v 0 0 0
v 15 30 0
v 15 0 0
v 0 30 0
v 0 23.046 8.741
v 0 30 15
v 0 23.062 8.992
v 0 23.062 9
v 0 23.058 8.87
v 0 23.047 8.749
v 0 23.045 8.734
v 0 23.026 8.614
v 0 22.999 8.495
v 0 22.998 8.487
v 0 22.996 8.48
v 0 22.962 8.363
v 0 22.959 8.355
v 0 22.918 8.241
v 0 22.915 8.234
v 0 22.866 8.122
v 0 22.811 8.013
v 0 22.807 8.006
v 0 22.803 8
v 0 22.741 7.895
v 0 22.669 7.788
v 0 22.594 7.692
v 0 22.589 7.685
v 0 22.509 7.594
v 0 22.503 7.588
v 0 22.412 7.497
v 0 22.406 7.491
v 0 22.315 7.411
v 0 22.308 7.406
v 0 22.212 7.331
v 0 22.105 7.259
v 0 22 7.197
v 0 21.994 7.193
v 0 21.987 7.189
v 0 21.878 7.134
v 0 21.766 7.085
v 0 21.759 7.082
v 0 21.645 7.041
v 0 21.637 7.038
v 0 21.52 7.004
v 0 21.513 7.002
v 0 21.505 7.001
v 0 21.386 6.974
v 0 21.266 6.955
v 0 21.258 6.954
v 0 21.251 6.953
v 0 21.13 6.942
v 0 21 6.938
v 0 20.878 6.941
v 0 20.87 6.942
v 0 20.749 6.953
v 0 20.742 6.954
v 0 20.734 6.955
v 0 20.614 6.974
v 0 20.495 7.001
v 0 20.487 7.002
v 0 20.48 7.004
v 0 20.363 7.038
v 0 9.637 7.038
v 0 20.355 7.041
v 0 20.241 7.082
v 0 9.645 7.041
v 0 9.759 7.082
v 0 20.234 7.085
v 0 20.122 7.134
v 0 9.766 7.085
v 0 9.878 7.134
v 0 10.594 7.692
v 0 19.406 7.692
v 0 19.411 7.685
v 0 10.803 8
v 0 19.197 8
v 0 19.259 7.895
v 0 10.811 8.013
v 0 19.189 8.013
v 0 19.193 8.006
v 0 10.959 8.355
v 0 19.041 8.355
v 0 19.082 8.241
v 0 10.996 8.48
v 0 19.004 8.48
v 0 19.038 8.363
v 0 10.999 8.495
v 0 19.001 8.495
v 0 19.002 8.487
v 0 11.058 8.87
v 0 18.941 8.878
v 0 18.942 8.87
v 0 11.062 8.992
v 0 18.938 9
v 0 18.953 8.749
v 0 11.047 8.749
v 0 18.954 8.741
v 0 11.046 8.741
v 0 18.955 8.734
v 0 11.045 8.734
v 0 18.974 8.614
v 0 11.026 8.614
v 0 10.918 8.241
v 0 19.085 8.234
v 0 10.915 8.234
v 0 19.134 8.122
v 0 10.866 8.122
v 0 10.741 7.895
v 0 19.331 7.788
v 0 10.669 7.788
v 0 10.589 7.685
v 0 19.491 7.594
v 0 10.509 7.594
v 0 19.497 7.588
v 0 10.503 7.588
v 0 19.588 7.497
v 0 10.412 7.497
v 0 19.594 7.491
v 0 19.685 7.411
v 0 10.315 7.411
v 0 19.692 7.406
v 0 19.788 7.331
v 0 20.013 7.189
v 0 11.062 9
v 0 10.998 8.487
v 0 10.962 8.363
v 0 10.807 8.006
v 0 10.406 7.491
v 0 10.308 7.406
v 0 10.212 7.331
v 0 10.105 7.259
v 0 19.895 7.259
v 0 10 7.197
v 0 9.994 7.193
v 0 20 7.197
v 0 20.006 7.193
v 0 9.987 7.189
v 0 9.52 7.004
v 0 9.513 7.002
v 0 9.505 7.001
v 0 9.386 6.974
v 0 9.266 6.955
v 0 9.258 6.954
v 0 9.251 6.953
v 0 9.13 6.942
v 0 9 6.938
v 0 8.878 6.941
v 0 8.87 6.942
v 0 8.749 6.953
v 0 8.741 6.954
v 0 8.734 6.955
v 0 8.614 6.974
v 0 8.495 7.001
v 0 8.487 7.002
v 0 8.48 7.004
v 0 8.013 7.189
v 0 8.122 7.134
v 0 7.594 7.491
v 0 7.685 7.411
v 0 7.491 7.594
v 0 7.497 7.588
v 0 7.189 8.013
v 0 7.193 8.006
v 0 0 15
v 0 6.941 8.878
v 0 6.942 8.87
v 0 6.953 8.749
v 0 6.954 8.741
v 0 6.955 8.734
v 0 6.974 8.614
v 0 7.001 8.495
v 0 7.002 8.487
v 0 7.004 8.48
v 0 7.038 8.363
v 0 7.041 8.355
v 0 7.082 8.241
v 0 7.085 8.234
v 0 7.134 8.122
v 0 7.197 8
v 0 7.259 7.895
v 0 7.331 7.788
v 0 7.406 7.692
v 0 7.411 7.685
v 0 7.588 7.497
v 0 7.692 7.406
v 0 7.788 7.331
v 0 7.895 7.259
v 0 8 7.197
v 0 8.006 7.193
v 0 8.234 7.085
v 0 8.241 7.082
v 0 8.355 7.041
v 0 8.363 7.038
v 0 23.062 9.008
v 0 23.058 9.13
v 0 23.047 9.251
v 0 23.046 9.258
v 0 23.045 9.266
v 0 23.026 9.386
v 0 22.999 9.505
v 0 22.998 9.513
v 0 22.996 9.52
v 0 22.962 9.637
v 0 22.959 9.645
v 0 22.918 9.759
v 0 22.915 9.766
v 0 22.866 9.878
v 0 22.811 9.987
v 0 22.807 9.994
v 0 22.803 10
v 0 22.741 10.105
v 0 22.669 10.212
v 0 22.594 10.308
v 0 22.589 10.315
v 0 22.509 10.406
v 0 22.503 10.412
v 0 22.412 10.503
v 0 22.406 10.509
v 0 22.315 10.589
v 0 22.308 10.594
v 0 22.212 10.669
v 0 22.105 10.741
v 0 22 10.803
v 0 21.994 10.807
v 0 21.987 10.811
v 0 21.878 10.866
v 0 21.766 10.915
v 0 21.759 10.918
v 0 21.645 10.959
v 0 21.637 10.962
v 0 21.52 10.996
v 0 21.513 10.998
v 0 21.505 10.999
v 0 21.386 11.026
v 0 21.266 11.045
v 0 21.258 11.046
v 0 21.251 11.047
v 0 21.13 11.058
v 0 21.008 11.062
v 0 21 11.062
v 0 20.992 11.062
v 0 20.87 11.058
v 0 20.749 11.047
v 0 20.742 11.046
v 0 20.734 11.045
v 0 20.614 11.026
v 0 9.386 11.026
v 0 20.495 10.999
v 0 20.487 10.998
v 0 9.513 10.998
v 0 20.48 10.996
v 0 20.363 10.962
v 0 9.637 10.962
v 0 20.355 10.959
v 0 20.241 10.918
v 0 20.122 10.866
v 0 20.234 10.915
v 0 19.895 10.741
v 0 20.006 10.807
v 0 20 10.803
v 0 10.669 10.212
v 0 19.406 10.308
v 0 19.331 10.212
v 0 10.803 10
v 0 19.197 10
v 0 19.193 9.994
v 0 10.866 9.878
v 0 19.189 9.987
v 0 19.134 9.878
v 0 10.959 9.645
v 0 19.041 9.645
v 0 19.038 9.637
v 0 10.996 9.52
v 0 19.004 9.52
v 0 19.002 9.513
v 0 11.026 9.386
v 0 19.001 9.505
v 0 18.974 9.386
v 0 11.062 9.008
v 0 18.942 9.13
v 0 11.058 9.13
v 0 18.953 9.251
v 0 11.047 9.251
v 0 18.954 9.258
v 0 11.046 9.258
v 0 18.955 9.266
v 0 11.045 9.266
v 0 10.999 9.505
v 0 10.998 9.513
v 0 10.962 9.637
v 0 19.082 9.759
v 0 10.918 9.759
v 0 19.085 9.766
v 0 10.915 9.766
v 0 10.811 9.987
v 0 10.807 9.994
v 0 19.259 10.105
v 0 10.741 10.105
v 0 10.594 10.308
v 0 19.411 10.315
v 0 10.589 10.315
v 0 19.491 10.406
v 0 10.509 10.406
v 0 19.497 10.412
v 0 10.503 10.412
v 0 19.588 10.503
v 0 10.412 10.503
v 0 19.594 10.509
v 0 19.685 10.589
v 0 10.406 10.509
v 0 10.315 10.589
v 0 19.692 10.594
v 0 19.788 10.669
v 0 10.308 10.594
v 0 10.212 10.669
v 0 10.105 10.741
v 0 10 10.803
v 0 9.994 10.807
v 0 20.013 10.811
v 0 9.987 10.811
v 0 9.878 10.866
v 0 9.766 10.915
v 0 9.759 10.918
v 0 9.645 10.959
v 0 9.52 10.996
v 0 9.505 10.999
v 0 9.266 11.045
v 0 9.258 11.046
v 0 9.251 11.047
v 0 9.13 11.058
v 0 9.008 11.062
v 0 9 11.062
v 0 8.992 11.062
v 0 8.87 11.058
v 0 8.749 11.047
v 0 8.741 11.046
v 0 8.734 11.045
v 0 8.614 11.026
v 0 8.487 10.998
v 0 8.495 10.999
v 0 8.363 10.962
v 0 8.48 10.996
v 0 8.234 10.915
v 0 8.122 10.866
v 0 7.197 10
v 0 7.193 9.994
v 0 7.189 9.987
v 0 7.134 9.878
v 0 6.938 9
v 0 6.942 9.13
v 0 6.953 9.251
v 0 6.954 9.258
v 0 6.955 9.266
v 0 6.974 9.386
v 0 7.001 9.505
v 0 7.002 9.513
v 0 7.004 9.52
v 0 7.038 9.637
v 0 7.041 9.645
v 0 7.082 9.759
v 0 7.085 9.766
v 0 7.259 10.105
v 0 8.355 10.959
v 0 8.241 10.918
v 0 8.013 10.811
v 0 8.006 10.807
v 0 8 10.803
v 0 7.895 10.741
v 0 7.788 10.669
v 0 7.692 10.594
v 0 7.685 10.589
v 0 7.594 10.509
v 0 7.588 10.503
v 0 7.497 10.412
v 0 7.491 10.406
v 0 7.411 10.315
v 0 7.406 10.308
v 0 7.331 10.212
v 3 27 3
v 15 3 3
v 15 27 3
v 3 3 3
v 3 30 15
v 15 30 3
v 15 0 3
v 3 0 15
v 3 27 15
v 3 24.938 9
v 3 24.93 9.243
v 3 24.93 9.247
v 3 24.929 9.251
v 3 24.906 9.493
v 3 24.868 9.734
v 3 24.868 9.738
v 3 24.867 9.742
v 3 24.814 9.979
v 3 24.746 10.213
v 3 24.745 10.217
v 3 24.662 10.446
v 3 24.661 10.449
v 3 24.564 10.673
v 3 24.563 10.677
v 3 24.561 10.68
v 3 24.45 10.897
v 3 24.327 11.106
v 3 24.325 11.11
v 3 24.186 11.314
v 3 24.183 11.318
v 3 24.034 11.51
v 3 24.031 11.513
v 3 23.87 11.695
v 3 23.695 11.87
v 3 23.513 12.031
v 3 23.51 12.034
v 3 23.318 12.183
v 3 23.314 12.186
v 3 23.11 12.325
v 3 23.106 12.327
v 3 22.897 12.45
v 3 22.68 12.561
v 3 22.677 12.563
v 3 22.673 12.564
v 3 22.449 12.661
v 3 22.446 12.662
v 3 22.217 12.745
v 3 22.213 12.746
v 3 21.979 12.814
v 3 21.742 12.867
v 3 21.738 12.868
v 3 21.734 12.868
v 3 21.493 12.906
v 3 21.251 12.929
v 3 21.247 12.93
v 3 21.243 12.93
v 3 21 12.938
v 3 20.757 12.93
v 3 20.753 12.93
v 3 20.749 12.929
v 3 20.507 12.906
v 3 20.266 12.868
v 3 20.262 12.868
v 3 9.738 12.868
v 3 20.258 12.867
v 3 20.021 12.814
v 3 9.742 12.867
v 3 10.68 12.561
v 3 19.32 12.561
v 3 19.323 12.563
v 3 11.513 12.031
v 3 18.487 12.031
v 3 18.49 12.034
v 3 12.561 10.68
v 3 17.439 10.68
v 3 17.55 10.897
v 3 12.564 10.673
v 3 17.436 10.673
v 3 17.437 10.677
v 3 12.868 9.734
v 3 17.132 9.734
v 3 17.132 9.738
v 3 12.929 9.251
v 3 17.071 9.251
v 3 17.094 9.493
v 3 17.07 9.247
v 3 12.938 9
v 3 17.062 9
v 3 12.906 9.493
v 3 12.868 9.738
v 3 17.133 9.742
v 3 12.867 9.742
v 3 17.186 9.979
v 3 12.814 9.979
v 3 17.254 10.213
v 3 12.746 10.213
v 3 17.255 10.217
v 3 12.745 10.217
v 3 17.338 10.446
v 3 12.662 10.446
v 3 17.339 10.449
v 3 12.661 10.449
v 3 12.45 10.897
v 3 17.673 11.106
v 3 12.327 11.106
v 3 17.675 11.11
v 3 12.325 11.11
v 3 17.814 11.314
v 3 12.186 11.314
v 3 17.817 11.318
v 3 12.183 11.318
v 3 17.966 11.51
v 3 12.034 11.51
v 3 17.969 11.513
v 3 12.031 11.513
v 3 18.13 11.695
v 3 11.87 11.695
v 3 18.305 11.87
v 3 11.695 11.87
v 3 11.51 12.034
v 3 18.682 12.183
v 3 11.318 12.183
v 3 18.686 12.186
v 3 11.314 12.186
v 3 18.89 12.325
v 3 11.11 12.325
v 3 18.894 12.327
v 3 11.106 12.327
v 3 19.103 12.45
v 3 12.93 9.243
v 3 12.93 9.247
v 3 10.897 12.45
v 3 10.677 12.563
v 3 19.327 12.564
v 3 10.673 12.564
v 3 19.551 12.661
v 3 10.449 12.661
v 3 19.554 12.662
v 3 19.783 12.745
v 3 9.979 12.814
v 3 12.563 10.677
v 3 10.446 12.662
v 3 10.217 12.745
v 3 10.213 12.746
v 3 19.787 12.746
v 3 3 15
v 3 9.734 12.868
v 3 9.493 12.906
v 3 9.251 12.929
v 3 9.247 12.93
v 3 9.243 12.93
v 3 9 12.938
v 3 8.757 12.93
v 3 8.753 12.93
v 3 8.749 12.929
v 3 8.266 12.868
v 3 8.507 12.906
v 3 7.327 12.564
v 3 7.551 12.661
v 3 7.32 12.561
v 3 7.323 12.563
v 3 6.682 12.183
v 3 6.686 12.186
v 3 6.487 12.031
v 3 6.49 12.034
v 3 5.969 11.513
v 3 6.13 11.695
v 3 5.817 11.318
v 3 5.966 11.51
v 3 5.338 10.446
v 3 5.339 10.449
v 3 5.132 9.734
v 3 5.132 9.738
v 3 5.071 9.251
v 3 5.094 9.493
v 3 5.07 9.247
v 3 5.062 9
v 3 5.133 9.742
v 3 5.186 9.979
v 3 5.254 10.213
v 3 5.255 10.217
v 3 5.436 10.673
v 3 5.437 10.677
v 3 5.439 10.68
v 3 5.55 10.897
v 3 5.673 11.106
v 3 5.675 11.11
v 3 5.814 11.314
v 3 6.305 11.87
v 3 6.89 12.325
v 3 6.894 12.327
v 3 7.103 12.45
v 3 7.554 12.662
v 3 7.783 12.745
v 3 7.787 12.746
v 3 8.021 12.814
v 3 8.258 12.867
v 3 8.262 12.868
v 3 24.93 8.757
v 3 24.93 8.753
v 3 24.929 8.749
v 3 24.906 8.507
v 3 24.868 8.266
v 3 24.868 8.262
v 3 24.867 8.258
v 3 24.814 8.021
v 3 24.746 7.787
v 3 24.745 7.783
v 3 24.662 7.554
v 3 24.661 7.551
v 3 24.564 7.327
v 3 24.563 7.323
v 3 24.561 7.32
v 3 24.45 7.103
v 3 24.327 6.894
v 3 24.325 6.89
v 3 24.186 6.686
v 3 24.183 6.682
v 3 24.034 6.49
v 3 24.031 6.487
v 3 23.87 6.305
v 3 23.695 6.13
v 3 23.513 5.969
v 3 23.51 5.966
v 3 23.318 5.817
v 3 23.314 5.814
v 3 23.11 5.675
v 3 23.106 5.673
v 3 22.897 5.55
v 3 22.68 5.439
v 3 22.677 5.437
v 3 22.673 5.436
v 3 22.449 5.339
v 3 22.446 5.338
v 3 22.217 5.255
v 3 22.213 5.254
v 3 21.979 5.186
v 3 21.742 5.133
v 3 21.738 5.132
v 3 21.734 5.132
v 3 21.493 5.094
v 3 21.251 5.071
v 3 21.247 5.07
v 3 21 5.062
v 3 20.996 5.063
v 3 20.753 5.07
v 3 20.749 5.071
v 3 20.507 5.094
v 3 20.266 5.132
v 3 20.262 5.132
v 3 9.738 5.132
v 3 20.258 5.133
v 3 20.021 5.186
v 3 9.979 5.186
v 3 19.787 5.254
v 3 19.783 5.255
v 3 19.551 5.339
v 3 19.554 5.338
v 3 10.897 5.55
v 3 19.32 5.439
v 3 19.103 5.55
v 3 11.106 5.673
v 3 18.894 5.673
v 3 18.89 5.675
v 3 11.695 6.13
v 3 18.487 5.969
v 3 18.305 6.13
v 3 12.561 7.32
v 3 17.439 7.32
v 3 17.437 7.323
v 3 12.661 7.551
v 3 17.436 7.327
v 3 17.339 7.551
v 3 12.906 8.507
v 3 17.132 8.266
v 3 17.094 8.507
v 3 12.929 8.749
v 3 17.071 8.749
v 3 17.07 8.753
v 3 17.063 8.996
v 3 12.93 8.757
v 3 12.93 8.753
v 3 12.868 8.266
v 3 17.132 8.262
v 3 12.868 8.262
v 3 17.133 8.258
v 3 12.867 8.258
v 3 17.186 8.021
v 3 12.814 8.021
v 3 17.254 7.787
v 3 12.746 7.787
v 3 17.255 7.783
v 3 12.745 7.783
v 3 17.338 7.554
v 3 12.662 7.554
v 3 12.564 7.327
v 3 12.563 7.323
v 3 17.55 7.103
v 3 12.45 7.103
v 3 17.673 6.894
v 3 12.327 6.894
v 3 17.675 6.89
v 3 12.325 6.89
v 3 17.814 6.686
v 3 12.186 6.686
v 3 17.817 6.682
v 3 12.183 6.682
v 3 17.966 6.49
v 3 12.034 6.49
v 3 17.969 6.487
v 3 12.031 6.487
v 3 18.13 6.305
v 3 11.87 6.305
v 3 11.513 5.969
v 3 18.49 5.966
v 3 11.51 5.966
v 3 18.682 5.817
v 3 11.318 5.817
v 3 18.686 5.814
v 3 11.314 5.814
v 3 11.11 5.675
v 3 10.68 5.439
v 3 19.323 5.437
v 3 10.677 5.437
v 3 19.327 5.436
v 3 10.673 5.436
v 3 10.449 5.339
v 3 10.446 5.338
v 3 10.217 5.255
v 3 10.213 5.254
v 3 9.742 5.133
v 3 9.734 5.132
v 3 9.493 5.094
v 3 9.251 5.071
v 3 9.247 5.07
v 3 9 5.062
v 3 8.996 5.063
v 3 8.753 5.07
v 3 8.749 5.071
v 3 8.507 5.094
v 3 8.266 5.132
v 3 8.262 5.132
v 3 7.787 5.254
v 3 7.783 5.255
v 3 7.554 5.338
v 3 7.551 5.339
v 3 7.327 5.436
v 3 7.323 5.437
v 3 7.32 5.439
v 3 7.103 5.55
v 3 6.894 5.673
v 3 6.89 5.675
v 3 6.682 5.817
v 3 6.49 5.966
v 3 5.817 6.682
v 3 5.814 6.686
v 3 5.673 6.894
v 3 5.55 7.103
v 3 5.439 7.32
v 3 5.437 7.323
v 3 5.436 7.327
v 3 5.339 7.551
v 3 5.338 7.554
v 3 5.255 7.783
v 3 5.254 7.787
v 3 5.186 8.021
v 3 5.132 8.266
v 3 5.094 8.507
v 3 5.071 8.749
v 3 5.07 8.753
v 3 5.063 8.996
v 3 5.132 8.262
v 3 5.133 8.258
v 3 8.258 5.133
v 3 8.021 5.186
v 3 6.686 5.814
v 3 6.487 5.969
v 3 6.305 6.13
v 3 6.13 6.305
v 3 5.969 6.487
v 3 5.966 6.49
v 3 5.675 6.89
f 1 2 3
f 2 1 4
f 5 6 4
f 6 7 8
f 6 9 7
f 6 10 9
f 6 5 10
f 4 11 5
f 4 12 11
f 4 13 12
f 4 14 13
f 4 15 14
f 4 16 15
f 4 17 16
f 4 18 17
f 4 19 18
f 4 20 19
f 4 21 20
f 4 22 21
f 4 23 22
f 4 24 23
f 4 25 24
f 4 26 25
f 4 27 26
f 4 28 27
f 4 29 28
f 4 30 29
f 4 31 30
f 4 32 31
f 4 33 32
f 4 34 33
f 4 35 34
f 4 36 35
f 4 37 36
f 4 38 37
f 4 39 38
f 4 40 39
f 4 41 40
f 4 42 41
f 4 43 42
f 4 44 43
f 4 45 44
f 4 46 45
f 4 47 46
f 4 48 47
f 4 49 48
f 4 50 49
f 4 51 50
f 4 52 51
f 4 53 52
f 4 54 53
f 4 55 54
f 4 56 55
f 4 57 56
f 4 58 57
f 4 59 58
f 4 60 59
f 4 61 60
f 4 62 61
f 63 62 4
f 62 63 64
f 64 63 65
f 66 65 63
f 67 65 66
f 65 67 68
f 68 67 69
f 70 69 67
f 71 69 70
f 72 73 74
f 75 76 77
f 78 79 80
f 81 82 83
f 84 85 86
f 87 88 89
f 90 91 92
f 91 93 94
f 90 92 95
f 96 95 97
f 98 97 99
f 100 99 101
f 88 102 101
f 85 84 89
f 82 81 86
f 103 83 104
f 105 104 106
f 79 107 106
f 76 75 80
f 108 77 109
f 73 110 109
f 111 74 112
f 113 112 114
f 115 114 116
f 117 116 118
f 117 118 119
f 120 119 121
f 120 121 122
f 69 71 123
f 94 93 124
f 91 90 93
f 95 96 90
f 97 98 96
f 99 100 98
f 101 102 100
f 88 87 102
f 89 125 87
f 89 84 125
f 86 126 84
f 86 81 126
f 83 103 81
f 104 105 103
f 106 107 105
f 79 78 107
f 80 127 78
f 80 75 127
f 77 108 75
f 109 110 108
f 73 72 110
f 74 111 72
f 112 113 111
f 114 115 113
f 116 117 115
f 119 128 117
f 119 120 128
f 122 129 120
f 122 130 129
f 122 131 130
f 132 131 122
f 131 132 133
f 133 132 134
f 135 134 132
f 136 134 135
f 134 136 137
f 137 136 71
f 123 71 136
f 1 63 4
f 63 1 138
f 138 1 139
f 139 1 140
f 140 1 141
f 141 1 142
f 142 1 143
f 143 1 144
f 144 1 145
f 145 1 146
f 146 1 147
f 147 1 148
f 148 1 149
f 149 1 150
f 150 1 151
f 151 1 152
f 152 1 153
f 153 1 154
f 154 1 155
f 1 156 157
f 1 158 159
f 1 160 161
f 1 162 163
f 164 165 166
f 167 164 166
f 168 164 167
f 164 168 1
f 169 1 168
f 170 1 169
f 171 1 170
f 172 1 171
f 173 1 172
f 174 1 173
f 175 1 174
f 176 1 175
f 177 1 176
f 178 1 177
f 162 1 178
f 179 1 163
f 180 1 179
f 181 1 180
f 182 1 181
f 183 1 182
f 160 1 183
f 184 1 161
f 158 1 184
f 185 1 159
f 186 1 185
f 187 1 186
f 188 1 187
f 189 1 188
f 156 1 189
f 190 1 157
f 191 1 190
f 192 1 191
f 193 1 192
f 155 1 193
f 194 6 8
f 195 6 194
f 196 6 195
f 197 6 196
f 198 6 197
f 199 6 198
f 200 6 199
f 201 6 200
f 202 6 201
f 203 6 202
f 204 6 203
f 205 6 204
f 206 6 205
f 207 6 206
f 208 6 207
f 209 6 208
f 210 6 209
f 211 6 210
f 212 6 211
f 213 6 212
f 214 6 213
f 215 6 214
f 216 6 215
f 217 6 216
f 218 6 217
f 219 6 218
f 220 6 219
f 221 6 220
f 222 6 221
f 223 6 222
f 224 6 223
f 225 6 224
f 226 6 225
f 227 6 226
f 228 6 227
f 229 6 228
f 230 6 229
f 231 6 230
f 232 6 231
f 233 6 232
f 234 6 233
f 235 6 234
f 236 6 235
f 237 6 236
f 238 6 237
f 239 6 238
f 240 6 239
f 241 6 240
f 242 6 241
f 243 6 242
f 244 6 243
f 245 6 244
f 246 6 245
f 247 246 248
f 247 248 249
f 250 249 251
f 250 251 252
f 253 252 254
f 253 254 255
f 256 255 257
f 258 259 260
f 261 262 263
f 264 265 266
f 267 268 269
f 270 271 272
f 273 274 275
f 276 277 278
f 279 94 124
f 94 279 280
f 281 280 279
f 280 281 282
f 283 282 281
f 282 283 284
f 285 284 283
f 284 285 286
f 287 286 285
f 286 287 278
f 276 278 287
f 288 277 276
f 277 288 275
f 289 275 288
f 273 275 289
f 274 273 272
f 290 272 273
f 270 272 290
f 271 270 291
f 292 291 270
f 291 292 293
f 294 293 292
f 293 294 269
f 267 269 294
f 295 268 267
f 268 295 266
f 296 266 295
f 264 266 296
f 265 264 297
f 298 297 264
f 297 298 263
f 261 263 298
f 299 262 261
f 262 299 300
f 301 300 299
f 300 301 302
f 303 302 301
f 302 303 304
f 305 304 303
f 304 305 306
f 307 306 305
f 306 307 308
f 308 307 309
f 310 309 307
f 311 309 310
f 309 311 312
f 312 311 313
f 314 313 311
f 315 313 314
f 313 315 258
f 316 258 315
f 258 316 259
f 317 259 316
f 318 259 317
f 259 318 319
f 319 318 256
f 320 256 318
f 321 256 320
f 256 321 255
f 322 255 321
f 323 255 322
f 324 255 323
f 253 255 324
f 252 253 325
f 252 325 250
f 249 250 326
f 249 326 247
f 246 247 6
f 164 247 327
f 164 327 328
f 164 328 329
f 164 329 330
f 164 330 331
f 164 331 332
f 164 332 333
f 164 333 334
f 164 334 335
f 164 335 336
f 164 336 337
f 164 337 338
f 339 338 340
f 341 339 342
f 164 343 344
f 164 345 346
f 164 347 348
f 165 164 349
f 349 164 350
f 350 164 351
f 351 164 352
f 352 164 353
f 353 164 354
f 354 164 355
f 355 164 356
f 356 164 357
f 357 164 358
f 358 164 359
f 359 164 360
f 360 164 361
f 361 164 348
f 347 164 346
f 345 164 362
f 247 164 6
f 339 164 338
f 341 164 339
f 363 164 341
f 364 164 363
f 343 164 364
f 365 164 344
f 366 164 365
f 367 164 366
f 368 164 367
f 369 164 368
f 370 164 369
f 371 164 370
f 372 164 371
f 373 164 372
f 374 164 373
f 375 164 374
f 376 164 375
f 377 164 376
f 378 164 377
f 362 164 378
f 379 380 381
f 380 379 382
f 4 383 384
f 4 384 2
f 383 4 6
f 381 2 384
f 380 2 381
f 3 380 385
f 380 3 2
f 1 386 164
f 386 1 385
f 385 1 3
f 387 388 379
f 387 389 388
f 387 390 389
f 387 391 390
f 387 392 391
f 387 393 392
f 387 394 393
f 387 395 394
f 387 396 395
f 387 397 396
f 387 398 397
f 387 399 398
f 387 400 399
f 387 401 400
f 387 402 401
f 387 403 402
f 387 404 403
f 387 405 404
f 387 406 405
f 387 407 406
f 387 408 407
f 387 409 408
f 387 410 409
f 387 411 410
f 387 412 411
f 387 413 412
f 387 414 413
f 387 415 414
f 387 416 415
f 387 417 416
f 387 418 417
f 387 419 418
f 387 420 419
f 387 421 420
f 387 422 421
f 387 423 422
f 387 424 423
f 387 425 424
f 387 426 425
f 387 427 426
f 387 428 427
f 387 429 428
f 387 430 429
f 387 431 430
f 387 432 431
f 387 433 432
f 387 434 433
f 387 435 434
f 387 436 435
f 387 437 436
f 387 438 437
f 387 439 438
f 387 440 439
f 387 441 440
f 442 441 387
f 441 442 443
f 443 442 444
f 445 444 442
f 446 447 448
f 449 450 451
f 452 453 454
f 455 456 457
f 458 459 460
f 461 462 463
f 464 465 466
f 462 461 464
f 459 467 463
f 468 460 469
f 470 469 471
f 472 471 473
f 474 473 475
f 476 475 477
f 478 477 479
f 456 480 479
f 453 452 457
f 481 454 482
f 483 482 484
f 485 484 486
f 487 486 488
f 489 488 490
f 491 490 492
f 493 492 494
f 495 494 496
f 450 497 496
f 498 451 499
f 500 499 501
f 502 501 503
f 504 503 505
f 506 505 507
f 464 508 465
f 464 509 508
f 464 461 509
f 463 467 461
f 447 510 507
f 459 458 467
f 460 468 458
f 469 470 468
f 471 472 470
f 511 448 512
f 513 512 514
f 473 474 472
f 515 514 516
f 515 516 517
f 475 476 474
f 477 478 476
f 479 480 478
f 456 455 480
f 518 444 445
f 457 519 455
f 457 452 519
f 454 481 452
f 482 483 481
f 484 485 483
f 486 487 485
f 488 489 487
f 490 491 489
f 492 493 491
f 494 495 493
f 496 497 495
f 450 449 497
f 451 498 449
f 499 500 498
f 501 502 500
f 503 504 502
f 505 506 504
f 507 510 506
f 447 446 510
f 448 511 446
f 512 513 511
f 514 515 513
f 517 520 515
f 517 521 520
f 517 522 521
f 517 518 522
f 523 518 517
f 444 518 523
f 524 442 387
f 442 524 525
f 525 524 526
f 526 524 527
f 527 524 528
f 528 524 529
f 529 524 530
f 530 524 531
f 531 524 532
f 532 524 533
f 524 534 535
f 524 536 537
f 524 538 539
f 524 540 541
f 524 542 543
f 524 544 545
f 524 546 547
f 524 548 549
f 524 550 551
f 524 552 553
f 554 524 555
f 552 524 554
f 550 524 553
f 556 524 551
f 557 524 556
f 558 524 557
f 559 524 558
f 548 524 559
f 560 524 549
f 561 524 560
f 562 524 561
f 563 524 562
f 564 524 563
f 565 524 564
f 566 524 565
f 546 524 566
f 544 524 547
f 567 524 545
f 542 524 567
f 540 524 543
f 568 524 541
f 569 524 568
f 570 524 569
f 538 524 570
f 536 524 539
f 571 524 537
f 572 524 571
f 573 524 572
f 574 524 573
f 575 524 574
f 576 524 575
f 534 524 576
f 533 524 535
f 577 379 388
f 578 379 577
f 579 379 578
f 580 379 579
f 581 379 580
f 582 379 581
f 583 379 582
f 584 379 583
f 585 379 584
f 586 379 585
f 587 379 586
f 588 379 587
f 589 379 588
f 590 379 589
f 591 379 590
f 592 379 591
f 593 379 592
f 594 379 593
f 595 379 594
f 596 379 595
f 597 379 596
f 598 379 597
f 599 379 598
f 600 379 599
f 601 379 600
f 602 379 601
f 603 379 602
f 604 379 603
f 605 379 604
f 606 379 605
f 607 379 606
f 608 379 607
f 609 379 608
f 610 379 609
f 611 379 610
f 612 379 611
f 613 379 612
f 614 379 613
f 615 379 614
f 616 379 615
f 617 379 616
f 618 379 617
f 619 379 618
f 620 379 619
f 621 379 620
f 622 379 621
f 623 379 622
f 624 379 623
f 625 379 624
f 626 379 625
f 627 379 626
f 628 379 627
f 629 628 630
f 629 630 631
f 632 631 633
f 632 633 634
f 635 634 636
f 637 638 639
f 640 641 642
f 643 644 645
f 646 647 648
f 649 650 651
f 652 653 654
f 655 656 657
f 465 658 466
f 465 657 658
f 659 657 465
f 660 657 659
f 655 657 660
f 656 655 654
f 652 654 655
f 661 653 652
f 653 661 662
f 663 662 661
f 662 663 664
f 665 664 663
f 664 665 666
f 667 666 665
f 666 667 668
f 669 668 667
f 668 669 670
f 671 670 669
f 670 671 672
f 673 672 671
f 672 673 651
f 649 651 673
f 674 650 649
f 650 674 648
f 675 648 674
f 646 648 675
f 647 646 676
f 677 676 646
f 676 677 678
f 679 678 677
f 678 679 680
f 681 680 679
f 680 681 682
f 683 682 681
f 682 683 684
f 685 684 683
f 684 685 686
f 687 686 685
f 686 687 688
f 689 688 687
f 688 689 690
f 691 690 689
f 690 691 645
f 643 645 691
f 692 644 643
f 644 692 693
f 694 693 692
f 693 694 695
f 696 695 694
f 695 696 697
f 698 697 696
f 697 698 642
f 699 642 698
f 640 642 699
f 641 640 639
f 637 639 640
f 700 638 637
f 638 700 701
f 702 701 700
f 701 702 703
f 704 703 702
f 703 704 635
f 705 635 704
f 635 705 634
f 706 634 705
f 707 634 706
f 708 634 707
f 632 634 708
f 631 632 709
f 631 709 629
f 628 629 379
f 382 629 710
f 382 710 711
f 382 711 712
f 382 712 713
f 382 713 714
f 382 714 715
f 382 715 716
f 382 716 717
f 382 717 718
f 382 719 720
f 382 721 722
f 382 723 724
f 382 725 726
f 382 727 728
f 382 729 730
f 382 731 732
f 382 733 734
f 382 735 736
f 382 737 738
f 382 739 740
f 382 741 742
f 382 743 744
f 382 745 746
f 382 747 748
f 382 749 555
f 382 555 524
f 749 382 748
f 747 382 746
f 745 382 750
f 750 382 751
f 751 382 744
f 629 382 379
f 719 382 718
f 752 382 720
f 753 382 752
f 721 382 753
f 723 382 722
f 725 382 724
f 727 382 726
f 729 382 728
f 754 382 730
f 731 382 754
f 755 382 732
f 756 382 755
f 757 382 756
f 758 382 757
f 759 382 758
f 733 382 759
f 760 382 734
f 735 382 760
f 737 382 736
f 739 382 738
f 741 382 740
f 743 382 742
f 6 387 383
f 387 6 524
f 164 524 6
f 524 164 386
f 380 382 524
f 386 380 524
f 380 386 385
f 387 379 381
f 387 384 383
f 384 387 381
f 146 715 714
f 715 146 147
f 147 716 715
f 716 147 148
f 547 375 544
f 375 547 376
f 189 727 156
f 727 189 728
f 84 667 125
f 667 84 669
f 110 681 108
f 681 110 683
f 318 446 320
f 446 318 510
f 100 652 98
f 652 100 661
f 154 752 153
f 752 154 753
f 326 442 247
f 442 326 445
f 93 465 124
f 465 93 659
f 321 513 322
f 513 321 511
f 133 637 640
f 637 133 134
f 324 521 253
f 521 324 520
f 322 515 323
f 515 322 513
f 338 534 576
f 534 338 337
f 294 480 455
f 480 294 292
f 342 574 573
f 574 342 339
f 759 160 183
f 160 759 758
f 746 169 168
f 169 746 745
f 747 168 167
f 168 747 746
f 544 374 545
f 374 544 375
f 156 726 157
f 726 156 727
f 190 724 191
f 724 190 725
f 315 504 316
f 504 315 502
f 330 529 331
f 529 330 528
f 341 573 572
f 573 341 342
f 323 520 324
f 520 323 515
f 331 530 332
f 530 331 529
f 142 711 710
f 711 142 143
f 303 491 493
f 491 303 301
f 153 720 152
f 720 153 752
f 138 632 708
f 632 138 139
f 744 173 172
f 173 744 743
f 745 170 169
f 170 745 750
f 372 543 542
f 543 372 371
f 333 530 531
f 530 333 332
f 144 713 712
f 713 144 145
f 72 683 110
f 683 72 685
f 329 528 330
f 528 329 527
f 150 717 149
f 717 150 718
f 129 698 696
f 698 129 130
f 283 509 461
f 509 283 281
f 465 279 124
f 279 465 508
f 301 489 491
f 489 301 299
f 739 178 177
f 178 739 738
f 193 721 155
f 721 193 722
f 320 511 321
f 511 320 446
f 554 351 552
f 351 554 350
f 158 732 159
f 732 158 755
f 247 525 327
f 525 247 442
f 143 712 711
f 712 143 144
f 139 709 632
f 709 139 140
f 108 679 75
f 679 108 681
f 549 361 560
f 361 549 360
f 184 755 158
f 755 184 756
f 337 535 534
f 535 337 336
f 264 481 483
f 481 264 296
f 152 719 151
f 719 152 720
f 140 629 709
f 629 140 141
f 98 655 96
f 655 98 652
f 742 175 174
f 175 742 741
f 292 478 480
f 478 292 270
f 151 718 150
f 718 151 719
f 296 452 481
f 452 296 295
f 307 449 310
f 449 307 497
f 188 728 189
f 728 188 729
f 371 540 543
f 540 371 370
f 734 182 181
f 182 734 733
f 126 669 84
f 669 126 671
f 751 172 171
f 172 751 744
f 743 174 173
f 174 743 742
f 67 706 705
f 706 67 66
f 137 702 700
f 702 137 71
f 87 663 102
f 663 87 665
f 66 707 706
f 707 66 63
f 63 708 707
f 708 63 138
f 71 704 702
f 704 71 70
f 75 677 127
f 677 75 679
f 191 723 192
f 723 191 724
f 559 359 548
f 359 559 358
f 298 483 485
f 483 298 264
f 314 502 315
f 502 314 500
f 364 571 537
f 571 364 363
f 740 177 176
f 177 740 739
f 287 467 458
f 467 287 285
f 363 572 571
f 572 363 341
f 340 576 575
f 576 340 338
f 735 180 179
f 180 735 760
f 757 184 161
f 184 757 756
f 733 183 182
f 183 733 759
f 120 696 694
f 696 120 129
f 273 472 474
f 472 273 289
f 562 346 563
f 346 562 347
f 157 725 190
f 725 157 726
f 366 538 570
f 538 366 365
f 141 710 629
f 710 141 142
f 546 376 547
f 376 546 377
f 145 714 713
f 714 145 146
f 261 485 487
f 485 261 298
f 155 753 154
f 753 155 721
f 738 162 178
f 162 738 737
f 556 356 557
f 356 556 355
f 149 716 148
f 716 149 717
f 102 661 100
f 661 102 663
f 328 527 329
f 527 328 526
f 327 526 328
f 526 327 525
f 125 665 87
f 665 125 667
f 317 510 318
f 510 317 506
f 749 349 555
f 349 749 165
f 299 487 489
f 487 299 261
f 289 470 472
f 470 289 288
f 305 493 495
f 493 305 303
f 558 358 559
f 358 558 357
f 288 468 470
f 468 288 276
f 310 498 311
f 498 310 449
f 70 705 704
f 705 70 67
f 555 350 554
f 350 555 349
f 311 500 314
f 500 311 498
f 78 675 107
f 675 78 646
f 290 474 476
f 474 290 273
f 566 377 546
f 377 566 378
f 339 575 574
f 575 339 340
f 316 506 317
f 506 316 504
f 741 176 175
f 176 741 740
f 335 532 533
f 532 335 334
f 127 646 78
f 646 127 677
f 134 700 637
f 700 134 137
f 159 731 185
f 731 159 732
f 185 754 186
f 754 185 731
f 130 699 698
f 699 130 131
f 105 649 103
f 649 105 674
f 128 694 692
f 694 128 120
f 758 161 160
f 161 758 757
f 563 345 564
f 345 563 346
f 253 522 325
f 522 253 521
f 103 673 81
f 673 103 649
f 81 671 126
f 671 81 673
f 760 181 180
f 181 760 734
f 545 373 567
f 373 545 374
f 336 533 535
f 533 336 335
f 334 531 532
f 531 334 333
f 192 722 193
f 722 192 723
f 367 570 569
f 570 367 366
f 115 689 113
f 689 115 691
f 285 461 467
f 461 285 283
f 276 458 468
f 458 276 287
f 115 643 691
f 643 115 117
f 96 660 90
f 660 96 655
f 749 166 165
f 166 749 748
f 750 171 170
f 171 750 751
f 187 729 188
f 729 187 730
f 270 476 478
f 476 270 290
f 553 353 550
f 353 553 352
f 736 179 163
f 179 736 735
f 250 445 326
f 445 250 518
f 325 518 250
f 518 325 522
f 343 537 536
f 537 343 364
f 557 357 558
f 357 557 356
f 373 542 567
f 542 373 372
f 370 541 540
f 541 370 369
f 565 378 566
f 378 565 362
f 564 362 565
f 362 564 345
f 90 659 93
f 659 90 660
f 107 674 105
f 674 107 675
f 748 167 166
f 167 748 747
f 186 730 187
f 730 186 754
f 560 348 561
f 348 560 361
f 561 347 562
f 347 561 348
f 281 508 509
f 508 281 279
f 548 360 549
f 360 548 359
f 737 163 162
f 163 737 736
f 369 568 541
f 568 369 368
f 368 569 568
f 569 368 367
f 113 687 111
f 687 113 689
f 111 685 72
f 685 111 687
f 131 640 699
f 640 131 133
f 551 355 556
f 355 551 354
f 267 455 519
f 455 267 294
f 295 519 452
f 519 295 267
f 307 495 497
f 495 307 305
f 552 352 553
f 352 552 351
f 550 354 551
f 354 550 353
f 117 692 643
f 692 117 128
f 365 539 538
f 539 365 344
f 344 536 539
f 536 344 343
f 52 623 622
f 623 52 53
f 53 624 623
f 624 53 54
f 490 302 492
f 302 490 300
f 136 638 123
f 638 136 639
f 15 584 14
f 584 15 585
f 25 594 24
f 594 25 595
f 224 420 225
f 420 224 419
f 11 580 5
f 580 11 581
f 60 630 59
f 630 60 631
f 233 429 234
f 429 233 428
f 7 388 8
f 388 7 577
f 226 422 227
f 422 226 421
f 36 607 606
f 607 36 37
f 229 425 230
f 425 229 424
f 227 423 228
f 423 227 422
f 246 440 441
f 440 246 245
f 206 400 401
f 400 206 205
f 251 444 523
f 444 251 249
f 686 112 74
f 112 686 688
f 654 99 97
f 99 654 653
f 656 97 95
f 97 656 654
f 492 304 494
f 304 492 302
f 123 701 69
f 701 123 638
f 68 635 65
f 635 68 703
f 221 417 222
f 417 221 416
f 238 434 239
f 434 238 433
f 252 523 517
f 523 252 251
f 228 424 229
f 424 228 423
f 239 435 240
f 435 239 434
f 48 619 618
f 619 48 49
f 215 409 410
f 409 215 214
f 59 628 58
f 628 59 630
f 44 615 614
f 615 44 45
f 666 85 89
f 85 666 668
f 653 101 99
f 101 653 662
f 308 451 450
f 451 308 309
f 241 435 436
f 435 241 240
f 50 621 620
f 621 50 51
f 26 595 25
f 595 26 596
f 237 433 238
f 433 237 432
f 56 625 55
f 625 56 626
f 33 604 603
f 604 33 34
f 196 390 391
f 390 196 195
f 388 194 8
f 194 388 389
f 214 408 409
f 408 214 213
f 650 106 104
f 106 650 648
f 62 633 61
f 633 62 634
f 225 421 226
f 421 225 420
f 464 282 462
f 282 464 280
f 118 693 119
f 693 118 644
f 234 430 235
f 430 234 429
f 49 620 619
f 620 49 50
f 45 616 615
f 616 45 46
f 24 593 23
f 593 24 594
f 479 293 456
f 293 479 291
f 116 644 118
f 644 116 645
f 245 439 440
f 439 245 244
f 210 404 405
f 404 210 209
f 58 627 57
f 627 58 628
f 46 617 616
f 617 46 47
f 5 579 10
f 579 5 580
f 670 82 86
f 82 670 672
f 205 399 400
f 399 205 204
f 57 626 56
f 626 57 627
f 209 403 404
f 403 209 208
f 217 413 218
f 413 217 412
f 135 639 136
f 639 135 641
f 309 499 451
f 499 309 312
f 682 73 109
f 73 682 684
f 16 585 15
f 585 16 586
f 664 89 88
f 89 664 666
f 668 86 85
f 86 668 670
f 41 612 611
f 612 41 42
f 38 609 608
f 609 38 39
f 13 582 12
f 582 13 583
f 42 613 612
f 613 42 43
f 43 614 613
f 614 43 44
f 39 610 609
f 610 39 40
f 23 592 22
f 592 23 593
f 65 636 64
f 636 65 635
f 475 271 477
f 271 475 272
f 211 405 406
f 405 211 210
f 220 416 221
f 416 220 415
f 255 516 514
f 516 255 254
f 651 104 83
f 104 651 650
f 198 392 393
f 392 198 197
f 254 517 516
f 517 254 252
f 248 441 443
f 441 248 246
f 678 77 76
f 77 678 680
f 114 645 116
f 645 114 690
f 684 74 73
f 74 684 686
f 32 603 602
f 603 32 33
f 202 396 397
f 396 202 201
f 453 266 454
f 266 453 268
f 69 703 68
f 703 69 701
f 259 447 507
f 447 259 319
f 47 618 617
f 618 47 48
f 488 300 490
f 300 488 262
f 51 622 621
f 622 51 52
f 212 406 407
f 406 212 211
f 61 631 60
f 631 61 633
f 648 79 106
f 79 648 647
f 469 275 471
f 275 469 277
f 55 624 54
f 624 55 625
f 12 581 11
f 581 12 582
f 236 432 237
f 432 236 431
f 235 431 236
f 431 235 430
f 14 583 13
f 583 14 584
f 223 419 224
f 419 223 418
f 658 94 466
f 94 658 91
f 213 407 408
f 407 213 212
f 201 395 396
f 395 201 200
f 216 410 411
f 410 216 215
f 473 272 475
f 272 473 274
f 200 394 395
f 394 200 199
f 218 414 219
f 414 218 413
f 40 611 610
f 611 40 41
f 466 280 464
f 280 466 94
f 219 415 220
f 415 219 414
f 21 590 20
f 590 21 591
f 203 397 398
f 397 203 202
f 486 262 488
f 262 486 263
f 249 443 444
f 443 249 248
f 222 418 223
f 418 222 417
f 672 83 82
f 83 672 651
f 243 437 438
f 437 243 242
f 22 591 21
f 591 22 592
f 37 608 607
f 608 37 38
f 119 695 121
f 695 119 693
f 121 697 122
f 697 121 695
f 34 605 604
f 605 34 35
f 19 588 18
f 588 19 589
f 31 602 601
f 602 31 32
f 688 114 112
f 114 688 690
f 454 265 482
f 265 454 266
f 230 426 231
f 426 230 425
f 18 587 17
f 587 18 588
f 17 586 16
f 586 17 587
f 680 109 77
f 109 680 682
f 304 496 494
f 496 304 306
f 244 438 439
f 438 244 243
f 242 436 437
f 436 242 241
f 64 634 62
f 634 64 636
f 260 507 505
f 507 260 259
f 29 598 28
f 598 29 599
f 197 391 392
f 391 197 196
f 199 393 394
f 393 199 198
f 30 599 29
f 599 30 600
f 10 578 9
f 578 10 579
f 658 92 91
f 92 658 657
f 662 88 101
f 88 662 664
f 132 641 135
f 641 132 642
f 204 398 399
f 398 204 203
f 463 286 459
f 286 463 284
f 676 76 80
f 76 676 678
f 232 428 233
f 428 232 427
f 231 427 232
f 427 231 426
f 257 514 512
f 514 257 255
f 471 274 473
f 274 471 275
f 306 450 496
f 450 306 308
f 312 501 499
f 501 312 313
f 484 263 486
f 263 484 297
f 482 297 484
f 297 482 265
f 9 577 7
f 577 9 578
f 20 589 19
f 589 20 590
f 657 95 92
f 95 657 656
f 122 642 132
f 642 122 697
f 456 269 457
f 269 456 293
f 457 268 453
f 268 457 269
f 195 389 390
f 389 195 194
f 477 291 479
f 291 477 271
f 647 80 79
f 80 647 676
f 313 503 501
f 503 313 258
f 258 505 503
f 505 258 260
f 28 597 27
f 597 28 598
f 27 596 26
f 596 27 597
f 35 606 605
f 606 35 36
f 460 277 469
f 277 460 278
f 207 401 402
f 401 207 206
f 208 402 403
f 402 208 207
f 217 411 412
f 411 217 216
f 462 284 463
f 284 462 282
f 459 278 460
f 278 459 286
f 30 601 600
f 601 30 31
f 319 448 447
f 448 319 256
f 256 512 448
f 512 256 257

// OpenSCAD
depth=3;
size=15;
$fn=100;


//cornerSupport();
centerSupport();


module centerSupport() {
    difference() {
        union() {
            linear_extrude(depth) square([size,size*2]);
            translate([depth, 0, 0]) 
                rotate([0, -90, 0]) 
                linear_extrude(depth) 
                square([size,size*2]);
            
            translate([size, depth, depth]) 
                rotate([90, -90, 0]) 
                linear_extrude(depth) 
                polygon([[0,0],[0, size-depth], [size-depth,size-depth]]);
            
            translate([size, (size*2), depth])
                rotate([90, -90, 0]) 
                linear_extrude(depth) 
                polygon([[0,0],[0, size-depth], [size-depth,size-depth]]);
        }
        
        translate([depth+.1, (size/2)+depth/2, (size/2)+depth/2]) 
            rotate([-180, 90, 0])
            cylinder(depth+.2, 4, 2);
        
        translate([depth+.1, (size*2)-(size/2)-(depth/2), (size/2)+depth/2]) 
            rotate([-180, 90, 0])
            cylinder(depth+.2, 4, 2);
    }
}

module cornerSupport() {
    difference() {
        union() {
            linear_extrude(depth) square(size);
            translate([0, depth, 0]) rotate([90, 0, 0]) linear_extrude(depth) square(size);
            translate([depth, 0, 0]) rotate([0, -90, 0]) linear_extrude(depth) square(size);
        }
        translate([depth+.1, (size/2)+depth/2, (size/2)+depth/2]) 
            rotate([-180, 90, 0])
            cylinder(depth+.2, 4, 2);
        
        translate([(size/2)+depth/2, depth+.1, (size/2)+depth/2]) 
            rotate([-180, 90, 90])
            cylinder(depth+.2, 4, 2);
    }
}
